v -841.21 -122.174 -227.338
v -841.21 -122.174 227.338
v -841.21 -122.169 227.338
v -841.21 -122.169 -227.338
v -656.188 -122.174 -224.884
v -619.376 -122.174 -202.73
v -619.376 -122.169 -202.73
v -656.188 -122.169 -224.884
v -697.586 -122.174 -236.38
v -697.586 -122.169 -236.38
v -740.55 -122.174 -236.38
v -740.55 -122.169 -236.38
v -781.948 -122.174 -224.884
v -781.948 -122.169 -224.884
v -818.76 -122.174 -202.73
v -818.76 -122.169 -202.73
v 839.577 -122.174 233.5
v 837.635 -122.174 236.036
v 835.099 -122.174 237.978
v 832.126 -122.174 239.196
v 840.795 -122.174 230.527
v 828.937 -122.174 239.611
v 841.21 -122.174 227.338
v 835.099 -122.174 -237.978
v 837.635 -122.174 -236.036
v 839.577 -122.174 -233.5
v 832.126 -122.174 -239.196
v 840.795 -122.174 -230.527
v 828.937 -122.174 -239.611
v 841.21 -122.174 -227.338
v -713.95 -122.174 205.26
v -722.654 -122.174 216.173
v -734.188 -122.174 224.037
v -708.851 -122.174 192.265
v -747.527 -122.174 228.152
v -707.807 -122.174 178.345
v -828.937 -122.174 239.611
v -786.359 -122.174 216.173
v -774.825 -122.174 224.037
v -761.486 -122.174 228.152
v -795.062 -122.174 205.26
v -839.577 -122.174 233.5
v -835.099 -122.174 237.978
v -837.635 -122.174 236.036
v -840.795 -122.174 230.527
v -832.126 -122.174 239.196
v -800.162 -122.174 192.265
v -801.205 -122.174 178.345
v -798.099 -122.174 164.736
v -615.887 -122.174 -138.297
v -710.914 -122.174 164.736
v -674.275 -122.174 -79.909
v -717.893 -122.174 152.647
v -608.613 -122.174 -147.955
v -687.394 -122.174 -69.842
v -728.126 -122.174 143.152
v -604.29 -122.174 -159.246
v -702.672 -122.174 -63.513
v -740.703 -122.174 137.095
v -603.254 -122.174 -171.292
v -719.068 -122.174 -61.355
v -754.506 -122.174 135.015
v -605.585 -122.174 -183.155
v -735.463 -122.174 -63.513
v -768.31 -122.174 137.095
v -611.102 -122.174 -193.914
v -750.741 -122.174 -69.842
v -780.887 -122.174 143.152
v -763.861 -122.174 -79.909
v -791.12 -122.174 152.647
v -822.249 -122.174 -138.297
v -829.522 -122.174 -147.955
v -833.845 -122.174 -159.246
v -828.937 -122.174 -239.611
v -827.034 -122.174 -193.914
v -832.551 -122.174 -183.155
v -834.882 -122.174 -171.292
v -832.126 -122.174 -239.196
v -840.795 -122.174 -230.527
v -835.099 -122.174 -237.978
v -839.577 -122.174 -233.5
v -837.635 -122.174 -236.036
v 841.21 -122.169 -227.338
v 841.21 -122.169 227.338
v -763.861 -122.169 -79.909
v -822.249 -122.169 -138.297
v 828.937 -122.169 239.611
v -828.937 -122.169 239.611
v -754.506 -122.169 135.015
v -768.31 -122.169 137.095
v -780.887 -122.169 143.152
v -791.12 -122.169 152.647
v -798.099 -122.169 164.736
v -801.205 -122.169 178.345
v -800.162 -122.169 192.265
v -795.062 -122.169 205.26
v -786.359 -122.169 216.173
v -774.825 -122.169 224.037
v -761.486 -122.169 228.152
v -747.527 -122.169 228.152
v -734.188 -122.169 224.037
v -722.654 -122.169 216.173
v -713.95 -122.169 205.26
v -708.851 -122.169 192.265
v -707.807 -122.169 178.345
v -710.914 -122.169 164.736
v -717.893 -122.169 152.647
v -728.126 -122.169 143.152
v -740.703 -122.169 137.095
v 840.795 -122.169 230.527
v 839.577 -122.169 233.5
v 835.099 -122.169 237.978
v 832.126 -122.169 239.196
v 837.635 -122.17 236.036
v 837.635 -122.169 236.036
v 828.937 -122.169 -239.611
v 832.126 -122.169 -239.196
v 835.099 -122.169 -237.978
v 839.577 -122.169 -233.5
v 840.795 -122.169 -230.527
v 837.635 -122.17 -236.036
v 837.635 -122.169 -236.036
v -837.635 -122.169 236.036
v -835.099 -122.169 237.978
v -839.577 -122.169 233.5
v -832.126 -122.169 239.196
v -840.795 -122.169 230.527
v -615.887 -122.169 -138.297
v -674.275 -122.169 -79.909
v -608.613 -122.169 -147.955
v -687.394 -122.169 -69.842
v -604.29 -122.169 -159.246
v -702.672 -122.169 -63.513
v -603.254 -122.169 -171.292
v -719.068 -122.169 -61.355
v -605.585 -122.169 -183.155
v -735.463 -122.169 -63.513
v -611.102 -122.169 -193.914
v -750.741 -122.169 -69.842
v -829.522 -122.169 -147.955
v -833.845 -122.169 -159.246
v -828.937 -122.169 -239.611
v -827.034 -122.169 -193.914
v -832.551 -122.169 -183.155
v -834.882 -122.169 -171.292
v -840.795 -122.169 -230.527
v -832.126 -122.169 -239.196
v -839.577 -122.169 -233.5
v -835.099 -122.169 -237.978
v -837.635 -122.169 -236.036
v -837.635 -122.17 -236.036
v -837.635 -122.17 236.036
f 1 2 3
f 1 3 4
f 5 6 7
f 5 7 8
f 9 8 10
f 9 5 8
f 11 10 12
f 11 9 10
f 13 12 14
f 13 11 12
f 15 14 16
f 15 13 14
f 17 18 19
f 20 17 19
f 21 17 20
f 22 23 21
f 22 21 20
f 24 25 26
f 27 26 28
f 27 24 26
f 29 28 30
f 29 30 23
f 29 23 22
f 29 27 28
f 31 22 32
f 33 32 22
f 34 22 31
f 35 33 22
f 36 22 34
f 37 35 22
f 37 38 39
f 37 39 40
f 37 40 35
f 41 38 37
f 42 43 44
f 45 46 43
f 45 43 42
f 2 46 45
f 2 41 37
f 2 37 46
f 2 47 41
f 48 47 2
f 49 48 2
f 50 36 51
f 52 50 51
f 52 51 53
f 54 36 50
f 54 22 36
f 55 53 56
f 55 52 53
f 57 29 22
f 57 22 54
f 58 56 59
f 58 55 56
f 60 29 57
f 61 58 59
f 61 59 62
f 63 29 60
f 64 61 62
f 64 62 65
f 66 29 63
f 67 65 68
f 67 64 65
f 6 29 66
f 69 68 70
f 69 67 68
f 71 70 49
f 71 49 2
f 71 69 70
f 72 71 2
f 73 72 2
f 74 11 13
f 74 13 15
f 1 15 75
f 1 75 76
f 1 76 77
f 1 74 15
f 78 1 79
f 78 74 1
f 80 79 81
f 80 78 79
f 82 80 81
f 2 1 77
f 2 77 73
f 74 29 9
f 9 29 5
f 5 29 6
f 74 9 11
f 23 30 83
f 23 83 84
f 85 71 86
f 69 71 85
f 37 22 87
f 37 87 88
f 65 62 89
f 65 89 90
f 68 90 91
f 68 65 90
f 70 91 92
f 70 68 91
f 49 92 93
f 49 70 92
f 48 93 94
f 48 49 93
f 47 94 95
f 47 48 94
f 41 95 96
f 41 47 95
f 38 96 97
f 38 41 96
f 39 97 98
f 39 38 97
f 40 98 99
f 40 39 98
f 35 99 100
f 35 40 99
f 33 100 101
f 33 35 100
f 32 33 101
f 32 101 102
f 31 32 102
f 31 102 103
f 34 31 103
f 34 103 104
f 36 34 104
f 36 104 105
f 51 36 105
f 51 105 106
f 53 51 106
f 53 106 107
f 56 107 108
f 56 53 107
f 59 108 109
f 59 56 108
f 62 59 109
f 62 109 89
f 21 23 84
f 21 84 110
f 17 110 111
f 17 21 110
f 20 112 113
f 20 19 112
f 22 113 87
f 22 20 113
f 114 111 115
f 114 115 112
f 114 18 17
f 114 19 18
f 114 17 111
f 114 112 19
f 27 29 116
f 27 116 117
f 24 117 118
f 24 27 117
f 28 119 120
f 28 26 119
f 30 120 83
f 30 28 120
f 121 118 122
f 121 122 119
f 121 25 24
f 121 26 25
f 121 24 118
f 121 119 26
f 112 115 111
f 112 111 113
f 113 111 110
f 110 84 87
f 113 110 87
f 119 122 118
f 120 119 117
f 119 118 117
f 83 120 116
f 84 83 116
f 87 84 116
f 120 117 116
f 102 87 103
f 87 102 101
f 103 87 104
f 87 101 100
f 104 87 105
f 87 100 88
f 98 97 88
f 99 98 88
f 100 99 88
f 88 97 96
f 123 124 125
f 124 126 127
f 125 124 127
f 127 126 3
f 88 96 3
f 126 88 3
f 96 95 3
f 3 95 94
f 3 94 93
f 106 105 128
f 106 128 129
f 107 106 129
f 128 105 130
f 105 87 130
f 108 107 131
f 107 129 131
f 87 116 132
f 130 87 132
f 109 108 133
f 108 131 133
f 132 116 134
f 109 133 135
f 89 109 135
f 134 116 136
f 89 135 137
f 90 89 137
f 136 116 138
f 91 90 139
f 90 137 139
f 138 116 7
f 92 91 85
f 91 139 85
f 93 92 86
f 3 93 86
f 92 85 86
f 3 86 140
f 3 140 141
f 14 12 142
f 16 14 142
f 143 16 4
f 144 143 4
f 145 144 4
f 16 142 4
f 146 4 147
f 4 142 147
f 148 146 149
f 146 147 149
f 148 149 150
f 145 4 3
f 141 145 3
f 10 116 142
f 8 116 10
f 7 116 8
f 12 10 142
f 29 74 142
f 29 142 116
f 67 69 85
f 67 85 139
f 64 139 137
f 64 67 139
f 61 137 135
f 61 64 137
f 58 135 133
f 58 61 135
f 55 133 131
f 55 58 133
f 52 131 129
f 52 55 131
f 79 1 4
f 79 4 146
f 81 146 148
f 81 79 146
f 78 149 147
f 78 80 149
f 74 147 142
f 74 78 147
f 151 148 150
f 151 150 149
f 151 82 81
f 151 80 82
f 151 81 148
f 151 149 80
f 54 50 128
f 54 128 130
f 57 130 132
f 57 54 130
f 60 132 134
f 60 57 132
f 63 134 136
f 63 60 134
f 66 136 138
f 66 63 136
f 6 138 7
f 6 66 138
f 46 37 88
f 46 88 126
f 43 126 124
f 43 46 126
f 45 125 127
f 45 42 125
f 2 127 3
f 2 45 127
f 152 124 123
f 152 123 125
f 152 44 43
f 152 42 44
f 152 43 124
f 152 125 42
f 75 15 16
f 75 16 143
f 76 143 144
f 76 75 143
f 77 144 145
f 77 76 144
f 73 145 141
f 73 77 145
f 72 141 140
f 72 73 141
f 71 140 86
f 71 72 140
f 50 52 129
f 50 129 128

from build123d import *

# Parameters (mm, degrees)
BOSS_EXTRUDE1_START = -122.174
SKETCH2_R           = 46.83
BOSS_EXTRUDE1_DEPTH = 0.005


with BuildPart() as part:
    # Sketch2 → Boss-Extrude1 (new body)
    with BuildSketch(Plane(origin=(0, 0, 0), x_dir=(1, 0, 0), z_dir=(0, 1, 0)).offset(BOSS_EXTRUDE1_START)):
        with BuildLine():
            Line((-841.209630395, -227.338277778), (-841.209630395, 227.338277778))
            add(Edge.make_bspline(
                [(-841.209630395, 227.338277778), (-841.209630395, 228.9412629), (-840.578161906, 232.191113095), (-837.861109298, 236.262109298), (-833.790113095, 238.979161906), (-830.5402629, 239.610630395), (-828.937277778, 239.610630395)],
                knots=[-0.770319033, -0.770319033, -0.770319033, -0.770319033, -0.385159516, 0, 0.385159516, 0.770319033, 0.770319033, 0.770319033, 0.770319033], degree=3))
            Line((-828.937277778, 239.610630395), (828.937277778, 239.610630395))
            add(Edge.make_bspline(
                [(828.937277778, 239.610630395), (830.5402629, 239.610630395), (833.790113095, 238.979161906), (837.861109298, 236.262109298), (840.578161906, 232.191113095), (841.209630395, 228.9412629), (841.209630395, 227.338277778)],
                knots=[-0.770319033, -0.770319033, -0.770319033, -0.770319033, -0.385159516, 0, 0.385159516, 0.770319033, 0.770319033, 0.770319033, 0.770319033], degree=3))
            Line((841.209630395, 227.338277778), (841.209630395, -227.338277778))
            add(Edge.make_bspline(
                [(841.209630395, -227.338277778), (841.209630395, -228.9412629), (840.578161906, -232.191113095), (837.861109298, -236.262109298), (833.790113095, -238.979161906), (830.5402629, -239.610630395), (828.937277778, -239.610630395)],
                knots=[-0.770319033, -0.770319033, -0.770319033, -0.770319033, -0.385159516, 0, 0.385159516, 0.770319033, 0.770319033, 0.770319033, 0.770319033], degree=3))
            Line((828.937277778, -239.610630395), (-828.937277778, -239.610630395))
            add(Edge.make_bspline(
                [(-828.937277778, -239.610630395), (-830.5402629, -239.610630395), (-833.790113095, -238.979161906), (-837.861109298, -236.262109298), (-840.578161906, -232.191113095), (-841.209630395, -228.9412629), (-841.209630395, -227.338277778)],
                knots=[-0.770319033, -0.770319033, -0.770319033, -0.770319033, -0.385159516, 0, 0.385159516, 0.770319033, 0.770319033, 0.770319033, 0.770319033], degree=3))
        make_face()
        with Locations(Location((-754.506388348, -181.844577047, 0), (0, 0, 90))):
            Circle(SKETCH2_R, mode=Mode.SUBTRACT)
        with BuildLine():
            Line((-822.249073579, 138.296696732), (-763.86109258, 79.908715733))
            ThreePointArc((-763.86109258, 79.908715733), (-719.067867535, 61.354754417), (-674.274642491, 79.908715733))
            Line((-674.274642491, 79.908715733), (-615.886661491, 138.296696732))
            ThreePointArc((-615.886661491, 138.296696732), (-603.25398635, 171.291776492), (-619.37596705, 202.729675721))
            ThreePointArc((-619.37596705, 202.729675721), (-719.067867535, 237.83718636), (-818.75976802, 202.729675721))
            ThreePointArc((-818.75976802, 202.729675721), (-834.88174872, 171.291776492), (-822.249073579, 138.296696732))
        make_face(mode=Mode.SUBTRACT)
    extrude(amount=BOSS_EXTRUDE1_DEPTH)


solid = part.part
